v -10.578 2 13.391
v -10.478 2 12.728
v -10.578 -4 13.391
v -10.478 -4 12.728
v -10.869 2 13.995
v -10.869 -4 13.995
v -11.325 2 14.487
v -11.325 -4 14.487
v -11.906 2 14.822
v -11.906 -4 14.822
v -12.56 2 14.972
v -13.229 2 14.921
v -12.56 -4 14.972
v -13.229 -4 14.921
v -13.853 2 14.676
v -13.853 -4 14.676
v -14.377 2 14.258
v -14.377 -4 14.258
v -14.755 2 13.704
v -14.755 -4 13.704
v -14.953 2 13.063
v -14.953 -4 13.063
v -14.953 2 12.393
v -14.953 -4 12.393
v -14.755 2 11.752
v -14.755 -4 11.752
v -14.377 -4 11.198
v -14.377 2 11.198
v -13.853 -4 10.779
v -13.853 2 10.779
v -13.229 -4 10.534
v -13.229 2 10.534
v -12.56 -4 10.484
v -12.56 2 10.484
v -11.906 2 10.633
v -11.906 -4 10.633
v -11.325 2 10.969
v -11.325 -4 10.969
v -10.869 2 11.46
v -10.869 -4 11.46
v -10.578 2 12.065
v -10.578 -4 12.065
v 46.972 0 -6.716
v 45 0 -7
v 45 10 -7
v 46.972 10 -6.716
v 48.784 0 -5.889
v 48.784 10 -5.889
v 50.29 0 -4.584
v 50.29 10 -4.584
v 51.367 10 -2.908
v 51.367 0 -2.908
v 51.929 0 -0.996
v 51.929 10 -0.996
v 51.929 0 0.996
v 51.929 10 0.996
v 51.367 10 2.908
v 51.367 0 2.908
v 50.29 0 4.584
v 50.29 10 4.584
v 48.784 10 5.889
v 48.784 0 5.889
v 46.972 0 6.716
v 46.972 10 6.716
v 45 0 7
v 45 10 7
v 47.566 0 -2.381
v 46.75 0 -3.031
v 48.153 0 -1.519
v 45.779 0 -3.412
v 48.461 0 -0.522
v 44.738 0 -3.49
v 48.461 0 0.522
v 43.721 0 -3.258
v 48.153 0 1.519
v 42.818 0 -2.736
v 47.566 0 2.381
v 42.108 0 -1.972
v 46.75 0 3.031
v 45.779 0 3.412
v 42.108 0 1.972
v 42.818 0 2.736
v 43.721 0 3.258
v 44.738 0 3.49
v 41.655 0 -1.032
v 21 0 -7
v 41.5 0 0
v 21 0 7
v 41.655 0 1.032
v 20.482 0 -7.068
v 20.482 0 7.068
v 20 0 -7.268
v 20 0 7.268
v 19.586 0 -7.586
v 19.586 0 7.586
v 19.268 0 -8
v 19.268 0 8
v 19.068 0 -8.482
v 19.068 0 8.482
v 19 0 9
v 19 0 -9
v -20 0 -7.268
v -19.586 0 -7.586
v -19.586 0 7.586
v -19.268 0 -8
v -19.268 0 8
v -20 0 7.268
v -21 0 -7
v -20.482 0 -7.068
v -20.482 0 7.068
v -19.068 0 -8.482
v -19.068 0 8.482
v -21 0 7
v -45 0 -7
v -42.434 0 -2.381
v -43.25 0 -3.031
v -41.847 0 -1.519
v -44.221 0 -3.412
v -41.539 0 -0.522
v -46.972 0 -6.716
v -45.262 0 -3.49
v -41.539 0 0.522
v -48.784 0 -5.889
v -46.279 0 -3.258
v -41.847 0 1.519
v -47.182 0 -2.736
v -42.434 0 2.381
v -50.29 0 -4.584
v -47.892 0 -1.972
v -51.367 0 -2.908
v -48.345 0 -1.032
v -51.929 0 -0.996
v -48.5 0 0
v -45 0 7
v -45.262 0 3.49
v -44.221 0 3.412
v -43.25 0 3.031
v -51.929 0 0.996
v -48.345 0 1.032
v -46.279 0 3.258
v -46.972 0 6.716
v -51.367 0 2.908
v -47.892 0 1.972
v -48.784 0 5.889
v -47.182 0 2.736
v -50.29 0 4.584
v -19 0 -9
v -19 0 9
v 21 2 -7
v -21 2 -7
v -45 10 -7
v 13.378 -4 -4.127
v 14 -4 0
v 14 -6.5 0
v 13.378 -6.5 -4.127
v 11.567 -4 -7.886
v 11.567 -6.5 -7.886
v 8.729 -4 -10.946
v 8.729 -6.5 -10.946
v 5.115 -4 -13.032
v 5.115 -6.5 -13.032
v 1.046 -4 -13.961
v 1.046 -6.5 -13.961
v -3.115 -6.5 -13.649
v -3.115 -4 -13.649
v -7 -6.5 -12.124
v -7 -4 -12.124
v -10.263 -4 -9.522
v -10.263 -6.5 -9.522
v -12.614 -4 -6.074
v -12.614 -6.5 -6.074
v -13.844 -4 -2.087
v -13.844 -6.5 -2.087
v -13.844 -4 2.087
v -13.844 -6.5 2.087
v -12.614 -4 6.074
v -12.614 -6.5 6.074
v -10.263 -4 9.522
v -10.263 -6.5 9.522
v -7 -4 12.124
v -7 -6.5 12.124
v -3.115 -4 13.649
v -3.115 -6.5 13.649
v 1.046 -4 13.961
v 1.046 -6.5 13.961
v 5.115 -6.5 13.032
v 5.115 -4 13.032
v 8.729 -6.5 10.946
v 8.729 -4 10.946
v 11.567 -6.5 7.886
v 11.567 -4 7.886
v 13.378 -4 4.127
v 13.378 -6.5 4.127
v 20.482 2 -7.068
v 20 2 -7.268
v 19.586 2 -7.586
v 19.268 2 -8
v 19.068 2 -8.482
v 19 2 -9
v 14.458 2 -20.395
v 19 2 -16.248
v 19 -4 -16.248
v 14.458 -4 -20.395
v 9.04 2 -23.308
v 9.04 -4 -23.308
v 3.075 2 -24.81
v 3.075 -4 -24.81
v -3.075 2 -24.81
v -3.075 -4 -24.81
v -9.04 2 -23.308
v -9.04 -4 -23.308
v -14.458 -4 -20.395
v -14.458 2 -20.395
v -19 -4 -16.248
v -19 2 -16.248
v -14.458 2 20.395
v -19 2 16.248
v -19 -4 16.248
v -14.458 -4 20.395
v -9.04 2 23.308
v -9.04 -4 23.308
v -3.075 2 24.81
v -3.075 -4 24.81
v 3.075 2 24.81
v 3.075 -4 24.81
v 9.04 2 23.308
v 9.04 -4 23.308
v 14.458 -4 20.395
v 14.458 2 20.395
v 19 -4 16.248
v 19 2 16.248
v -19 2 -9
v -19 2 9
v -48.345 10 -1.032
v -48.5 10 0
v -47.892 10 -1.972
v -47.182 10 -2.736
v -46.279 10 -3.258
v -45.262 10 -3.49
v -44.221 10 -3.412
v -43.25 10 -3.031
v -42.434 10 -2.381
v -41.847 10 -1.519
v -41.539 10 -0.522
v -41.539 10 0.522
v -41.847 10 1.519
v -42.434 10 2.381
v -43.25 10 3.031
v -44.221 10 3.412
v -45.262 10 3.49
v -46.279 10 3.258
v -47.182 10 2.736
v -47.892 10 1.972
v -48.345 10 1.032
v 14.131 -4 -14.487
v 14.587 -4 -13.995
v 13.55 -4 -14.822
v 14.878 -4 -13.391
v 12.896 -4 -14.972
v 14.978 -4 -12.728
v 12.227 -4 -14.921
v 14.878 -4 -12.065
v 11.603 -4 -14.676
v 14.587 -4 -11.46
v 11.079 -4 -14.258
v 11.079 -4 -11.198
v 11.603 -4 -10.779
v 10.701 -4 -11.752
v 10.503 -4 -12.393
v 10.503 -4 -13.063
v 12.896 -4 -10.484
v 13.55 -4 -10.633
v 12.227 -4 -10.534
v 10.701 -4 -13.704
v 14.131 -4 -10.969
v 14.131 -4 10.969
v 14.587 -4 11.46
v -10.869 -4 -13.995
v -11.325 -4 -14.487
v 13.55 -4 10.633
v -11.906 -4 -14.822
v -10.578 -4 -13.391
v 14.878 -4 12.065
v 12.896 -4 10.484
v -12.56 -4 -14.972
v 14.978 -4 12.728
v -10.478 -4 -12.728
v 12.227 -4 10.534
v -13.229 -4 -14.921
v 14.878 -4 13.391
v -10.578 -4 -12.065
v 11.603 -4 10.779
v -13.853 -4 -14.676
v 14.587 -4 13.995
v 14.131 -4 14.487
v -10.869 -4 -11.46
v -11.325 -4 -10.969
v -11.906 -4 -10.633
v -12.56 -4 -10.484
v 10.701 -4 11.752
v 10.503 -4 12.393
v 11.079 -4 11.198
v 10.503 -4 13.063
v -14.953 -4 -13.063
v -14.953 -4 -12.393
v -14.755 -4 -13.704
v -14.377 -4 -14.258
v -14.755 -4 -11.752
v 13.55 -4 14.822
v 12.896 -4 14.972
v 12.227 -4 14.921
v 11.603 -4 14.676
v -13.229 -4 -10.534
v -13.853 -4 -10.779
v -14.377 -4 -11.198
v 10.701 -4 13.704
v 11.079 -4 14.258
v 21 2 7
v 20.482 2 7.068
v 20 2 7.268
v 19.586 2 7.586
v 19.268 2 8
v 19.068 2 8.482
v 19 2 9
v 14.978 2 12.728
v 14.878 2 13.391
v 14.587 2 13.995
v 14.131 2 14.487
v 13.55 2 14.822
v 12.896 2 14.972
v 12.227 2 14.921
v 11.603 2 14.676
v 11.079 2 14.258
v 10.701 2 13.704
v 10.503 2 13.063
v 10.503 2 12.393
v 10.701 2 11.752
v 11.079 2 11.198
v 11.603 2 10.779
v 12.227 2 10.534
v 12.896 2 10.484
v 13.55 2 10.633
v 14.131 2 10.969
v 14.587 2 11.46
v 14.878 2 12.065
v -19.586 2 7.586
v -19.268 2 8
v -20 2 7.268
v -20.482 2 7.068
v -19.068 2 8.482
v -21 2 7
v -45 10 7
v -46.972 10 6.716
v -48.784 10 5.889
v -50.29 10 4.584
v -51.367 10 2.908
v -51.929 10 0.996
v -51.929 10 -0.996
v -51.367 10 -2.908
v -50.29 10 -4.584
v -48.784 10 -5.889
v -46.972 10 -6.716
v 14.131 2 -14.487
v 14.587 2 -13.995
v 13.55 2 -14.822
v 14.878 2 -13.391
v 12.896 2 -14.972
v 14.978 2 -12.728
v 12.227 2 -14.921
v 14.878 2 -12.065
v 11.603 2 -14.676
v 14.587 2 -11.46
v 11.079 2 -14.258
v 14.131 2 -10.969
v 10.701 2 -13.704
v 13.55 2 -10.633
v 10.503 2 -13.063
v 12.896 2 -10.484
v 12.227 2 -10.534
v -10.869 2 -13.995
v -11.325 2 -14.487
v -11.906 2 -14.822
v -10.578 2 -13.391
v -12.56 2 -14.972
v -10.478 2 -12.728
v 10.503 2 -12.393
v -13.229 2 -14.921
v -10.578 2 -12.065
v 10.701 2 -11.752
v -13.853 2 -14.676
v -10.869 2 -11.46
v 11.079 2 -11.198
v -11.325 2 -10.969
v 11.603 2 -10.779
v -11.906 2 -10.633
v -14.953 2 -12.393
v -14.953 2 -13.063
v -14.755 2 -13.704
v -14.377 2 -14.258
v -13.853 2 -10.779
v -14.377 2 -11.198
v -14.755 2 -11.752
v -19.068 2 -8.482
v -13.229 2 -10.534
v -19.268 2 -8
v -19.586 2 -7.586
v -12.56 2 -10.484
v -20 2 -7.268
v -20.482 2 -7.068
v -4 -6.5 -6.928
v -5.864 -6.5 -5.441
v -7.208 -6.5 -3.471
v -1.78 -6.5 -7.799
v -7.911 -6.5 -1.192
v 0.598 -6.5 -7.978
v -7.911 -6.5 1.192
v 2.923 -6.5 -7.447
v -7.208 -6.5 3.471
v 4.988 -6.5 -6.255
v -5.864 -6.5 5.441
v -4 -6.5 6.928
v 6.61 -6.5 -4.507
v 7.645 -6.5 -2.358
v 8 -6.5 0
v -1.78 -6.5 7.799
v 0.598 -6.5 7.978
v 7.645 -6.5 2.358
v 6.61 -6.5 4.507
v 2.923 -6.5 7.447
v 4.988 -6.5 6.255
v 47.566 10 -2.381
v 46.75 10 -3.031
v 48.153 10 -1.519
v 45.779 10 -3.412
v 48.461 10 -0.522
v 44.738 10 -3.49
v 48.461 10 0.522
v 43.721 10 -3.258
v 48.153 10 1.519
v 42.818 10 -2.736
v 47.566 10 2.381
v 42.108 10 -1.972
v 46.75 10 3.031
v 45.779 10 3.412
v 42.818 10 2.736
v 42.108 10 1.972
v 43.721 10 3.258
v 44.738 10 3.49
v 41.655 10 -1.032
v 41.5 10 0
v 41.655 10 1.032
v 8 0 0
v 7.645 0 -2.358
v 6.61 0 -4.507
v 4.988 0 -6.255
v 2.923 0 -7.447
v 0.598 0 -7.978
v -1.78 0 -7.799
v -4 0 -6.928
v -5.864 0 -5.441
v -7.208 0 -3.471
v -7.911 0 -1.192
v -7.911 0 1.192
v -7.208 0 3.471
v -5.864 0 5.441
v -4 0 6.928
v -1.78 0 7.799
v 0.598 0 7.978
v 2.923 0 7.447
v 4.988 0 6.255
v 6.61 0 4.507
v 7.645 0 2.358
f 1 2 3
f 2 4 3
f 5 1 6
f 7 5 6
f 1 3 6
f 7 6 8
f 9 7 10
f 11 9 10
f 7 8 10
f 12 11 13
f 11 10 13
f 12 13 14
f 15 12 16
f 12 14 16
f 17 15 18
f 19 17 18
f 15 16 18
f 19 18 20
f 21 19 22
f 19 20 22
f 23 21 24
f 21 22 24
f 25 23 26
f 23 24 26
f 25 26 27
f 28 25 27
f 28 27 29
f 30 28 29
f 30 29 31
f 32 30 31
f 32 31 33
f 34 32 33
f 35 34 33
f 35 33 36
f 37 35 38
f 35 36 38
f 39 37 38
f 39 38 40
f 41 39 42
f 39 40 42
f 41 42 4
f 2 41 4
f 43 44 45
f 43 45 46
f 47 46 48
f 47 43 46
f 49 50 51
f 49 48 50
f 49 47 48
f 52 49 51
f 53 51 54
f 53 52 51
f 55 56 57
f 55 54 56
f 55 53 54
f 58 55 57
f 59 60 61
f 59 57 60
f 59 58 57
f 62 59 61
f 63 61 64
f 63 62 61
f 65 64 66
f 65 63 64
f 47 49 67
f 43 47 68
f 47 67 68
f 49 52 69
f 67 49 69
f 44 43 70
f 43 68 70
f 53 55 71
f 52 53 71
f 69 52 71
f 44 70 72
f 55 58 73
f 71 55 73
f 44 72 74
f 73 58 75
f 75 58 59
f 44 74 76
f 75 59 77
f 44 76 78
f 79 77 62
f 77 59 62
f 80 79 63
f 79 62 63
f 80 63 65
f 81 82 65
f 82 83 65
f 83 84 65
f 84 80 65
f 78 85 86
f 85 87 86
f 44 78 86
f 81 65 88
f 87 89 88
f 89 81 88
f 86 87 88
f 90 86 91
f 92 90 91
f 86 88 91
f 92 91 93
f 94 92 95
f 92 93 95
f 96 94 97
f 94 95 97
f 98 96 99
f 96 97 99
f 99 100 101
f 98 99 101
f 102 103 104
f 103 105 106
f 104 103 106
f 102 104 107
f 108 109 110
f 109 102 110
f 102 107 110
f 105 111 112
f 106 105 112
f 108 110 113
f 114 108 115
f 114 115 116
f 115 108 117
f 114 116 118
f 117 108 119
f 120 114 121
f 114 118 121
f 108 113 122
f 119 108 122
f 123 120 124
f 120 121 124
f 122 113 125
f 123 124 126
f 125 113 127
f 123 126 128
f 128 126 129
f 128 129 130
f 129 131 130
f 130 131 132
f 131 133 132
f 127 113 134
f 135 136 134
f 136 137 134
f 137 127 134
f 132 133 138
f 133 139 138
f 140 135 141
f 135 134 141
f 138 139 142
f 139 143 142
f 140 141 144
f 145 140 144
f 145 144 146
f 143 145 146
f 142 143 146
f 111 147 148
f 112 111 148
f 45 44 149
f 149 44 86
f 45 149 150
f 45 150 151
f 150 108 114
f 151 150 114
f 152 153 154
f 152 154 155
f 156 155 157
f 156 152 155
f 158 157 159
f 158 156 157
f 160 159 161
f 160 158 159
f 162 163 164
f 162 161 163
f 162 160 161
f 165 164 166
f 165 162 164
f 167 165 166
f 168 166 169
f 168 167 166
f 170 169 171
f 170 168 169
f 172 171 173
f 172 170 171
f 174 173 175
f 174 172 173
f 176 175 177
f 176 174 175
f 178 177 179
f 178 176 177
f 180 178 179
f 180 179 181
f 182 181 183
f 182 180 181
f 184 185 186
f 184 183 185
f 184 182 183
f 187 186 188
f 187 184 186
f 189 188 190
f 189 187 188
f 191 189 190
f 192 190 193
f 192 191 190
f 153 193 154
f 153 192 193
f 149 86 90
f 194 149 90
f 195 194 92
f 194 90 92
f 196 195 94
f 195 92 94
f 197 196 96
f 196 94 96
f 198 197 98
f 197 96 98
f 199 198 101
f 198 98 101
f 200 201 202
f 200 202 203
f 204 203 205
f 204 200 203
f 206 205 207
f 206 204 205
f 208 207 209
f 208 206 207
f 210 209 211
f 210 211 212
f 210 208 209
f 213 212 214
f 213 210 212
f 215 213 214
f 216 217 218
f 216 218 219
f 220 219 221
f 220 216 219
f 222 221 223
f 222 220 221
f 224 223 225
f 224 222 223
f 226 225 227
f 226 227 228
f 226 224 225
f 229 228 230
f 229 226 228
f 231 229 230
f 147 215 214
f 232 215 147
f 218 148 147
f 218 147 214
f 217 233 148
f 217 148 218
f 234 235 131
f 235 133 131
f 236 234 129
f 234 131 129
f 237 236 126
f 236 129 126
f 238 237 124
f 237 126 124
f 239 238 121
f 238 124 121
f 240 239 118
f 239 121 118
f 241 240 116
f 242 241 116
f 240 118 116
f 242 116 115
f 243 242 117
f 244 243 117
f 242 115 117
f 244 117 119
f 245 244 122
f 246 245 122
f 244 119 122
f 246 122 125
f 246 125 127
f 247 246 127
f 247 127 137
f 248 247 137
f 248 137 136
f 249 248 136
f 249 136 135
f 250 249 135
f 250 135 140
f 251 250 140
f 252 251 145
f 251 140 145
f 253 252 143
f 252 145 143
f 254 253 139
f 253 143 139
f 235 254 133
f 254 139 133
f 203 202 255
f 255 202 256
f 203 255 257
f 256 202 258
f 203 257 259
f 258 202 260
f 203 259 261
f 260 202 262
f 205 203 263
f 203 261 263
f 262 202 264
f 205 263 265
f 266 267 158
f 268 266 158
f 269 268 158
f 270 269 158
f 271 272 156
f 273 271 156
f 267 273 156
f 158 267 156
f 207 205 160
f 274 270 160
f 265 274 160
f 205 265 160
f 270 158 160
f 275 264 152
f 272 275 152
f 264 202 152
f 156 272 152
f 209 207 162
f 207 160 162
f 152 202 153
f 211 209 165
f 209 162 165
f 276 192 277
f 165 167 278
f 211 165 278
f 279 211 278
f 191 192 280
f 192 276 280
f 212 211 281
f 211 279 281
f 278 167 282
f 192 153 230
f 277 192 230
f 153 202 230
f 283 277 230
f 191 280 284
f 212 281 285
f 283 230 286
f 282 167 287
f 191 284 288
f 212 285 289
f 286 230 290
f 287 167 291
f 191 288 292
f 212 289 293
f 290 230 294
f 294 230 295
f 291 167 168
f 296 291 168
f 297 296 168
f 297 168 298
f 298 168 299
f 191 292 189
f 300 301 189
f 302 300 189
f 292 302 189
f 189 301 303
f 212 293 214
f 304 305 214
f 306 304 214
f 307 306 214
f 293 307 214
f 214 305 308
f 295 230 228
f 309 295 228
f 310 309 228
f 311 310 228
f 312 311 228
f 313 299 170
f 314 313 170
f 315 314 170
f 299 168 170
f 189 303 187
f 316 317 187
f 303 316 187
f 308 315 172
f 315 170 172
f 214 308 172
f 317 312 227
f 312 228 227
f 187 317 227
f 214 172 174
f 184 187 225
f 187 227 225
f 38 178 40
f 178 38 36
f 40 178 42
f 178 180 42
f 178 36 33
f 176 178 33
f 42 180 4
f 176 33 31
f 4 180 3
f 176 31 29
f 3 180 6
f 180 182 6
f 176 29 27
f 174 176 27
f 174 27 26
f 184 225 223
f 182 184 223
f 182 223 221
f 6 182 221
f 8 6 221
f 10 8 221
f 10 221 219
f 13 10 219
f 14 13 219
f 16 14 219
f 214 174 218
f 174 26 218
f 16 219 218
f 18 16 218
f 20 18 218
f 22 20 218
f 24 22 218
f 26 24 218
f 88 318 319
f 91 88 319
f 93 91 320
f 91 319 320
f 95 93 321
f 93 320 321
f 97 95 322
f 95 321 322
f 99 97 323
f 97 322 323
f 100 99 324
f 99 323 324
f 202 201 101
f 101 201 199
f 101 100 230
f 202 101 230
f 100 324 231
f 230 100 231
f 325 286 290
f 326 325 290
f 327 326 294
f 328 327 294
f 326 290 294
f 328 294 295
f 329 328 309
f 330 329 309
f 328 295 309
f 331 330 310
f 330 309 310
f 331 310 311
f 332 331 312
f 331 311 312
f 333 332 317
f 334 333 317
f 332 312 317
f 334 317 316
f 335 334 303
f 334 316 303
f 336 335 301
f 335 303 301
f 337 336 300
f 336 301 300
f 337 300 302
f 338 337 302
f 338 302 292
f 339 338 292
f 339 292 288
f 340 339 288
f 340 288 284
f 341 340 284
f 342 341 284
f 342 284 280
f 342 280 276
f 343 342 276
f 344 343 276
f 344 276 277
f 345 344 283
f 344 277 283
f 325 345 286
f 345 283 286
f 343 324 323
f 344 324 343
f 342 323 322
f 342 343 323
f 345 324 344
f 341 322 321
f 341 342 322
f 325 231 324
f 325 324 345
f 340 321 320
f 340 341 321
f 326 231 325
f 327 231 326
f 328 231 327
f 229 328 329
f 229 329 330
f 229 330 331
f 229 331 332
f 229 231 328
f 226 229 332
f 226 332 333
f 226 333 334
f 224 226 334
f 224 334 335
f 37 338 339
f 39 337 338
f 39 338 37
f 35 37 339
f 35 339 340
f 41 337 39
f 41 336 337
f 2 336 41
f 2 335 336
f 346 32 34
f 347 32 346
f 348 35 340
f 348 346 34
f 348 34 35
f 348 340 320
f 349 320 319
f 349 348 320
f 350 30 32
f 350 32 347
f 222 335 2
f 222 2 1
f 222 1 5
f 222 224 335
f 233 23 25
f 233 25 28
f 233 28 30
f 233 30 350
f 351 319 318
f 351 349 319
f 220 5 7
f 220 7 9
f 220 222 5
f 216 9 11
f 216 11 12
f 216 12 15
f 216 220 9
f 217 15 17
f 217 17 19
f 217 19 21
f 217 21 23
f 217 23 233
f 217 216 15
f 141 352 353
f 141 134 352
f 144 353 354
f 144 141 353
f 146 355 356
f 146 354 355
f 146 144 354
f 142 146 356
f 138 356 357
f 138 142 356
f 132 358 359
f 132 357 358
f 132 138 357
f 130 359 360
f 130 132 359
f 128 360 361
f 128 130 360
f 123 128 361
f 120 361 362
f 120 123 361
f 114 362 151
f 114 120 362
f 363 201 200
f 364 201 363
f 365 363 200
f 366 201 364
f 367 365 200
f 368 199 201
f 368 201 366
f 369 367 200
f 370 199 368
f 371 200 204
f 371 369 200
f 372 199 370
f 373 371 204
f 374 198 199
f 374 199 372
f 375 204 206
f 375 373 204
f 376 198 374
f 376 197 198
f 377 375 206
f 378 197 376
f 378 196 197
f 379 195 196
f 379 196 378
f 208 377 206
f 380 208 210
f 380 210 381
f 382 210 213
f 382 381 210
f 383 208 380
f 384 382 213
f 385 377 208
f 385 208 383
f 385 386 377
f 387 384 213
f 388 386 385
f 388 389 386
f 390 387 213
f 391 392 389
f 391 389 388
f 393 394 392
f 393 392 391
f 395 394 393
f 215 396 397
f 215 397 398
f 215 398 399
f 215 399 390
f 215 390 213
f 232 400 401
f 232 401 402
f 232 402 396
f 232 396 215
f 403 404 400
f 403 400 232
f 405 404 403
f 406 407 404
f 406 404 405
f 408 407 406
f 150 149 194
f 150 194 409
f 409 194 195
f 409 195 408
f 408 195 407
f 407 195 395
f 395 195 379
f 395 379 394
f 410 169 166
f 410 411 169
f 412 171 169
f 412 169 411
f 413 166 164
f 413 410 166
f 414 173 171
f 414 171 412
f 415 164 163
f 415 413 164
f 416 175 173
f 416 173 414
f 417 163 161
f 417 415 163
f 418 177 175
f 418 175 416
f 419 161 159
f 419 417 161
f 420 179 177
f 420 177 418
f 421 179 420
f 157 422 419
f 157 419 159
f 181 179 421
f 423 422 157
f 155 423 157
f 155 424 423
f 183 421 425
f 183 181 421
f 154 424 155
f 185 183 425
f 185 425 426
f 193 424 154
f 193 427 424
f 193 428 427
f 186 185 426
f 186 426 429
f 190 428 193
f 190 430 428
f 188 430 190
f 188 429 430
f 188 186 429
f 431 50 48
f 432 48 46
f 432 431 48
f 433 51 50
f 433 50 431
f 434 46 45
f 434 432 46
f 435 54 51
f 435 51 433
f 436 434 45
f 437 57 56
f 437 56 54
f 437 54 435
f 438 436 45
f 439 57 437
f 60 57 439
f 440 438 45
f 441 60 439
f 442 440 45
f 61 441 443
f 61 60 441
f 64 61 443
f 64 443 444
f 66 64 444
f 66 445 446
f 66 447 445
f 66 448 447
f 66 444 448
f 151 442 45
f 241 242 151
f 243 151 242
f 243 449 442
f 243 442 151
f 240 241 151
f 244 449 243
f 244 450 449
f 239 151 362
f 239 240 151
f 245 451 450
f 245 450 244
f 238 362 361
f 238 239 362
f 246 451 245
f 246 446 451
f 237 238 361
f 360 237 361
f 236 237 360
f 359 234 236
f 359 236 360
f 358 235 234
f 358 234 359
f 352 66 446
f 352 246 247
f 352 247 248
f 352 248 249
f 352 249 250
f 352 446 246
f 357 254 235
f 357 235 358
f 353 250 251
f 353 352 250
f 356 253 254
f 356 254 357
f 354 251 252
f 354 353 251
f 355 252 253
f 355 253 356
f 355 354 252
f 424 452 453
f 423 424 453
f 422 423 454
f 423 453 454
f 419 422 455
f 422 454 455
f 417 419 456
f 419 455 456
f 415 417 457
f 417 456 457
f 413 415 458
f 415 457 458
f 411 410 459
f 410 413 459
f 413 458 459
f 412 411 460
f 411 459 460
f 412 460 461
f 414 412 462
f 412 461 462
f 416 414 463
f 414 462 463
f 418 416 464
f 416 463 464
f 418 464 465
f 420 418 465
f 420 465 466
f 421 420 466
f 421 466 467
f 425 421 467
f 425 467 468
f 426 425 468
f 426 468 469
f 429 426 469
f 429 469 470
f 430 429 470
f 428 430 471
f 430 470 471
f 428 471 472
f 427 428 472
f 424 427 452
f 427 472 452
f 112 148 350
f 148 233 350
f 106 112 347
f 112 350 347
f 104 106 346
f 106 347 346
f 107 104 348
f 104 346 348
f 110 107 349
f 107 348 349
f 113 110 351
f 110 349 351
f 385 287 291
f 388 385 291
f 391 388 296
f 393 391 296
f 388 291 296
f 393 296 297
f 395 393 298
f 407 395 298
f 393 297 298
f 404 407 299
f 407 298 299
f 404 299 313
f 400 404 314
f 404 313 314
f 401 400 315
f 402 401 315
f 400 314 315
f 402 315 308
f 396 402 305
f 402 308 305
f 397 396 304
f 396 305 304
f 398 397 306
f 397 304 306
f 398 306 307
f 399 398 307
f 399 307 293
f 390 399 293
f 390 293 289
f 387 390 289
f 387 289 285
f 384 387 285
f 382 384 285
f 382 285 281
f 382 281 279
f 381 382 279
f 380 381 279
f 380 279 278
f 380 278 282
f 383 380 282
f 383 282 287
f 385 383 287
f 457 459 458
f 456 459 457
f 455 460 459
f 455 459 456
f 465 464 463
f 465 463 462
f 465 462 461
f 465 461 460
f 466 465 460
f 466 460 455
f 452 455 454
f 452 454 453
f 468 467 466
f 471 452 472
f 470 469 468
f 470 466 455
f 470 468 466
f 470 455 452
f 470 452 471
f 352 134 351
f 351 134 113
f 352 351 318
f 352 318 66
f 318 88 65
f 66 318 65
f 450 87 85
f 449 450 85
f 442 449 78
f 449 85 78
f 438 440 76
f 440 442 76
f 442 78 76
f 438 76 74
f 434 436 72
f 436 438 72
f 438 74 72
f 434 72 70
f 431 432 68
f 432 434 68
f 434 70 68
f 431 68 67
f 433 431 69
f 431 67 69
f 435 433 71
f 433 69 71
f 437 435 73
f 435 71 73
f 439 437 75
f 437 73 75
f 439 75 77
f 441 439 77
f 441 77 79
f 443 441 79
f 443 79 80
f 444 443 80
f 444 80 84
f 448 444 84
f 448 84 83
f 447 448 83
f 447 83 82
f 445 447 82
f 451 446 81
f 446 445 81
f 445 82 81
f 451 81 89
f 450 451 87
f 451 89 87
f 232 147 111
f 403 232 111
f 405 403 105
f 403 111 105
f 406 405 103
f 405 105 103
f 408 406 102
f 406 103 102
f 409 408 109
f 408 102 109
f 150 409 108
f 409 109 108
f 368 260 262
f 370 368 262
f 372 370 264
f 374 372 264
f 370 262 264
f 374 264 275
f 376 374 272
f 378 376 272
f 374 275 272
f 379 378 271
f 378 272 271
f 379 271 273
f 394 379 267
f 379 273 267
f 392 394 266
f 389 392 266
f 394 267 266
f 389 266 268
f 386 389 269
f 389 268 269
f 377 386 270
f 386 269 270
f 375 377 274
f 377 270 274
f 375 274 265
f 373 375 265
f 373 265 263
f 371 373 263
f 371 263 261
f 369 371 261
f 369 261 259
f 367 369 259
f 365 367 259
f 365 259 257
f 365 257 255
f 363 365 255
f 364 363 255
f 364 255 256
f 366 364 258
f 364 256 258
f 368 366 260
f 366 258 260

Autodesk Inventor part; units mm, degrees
ref_plane "YZ Plane" through (0, 0, 0) normal (1, 0, 0) x (0, 1, 0)
ref_plane "XY Plane" through (0, 0, 0) normal (0, 0, 1) x (1, 0, 0)
sketch "Sketch1" plane through (0, 0, 0) normal (0, 1, 0) x (-1, 0, 0)
  line L0 (0, 0) -> (45, 0) construction
  line L1 (0, 0) -> (52, 0)
  line L2 (0, 0) -> (-45, 0)
  line L3 (-45, 0) -> (45, 0) construction
  line L4 (-45, -7) -> (45, -7)
  line L5 (45, 7) -> (-45, 7)
  arc A0 (-45, 7) -> (-45, -7) centre (-45, 0) ccw
  arc A1 (45, -7) -> (45, 7) centre (45, 0) ccw
  circle A2 centre (45, 0) radius 3.5
  circle A3 centre (-45, 0) radius 3.5
  dimension "d0" = 45
  dimension "d1" = 52
  dimension "d2" = 45
  dimension "d3" = 7
extrude "Extrusion1" add sketch "Sketch1" along normal blind 10
ref_plane "Work Plane1" through (0, 2, 0) normal (0, 1, 0) x (-1, 0, 0)
sketch "Sketch2" plane through (0, 2, 0) normal (0, 1, 0) x (-1, 0, 0)
  line L0 (0, 0) -> (19, 0)
  line L1 (19, 0) -> (19, -16.2481)
  line L2 (19, 0) -> (19, 16.2481)
  line L3 (0, 0) -> (-19, 0)
  line L4 (-19, 0) -> (-19, -16.2481)
  line L5 (-19, 0) -> (-19, 16.2481)
  arc A0 (-19, -16.2481) -> (19, -16.2481) centre (0, 0) ccw
  arc A1 (19, 16.2481) -> (-19, 16.2481) centre (0, 0) ccw
  dimension "d8" = 19
  dimension "d10" = 19
extrude "Extrusion2" add sketch "Sketch2" against normal blind 6
fillet "Fillet1" radius 2 4 edges at (-19, 1, -7) (-19, 1, 7) (19, 1, -7) (19, 1, 7)
sketch "Sketch3" plane through (0, -4, 0) normal (0, -1, 0) x (1, 0, 0)
  circle A0 centre (0, 0) radius 18 construction
  line L0 (0, 0) -> (12.7279, 12.7279) construction
  line L1 (0, 0) -> (18, 0) construction
  circle A1 centre (12.7279, 12.7279) radius 2.25
  circle A2 centre (-12.7279, 12.7279) radius 2.25
  circle A3 centre (-12.7279, -12.7279) radius 2.25
  circle A4 centre (12.7279, -12.7279) radius 2.25
  dimension "d14" = 36
  dimension "d15" = 45
  dimension "d16" = 4.5
  dimension "d19" = 360
extrude "Extrusion3" cut sketch "Sketch3" against normal blind 10
sketch "Sketch4" plane through (0, -4, 0) normal (0, -1, 0) x (1, 0, 0)
  circle A0 centre (0, 0) radius 14
  circle A1 centre (0, 0) radius 8
  dimension "d23" = 28
  dimension "d24" = 16
extrude "Extrusion4" add sketch "Sketch4" along normal blind 2.5
sketch "Sketch5" plane through (0, -4, 0) normal (0, -1, 0) x (1, 0, 0)
  circle A0 centre (0, 0) radius 8
extrude "Extrusion5" cut sketch "Sketch5" against normal blind 4
properties part number "Coperchio inferiore"
